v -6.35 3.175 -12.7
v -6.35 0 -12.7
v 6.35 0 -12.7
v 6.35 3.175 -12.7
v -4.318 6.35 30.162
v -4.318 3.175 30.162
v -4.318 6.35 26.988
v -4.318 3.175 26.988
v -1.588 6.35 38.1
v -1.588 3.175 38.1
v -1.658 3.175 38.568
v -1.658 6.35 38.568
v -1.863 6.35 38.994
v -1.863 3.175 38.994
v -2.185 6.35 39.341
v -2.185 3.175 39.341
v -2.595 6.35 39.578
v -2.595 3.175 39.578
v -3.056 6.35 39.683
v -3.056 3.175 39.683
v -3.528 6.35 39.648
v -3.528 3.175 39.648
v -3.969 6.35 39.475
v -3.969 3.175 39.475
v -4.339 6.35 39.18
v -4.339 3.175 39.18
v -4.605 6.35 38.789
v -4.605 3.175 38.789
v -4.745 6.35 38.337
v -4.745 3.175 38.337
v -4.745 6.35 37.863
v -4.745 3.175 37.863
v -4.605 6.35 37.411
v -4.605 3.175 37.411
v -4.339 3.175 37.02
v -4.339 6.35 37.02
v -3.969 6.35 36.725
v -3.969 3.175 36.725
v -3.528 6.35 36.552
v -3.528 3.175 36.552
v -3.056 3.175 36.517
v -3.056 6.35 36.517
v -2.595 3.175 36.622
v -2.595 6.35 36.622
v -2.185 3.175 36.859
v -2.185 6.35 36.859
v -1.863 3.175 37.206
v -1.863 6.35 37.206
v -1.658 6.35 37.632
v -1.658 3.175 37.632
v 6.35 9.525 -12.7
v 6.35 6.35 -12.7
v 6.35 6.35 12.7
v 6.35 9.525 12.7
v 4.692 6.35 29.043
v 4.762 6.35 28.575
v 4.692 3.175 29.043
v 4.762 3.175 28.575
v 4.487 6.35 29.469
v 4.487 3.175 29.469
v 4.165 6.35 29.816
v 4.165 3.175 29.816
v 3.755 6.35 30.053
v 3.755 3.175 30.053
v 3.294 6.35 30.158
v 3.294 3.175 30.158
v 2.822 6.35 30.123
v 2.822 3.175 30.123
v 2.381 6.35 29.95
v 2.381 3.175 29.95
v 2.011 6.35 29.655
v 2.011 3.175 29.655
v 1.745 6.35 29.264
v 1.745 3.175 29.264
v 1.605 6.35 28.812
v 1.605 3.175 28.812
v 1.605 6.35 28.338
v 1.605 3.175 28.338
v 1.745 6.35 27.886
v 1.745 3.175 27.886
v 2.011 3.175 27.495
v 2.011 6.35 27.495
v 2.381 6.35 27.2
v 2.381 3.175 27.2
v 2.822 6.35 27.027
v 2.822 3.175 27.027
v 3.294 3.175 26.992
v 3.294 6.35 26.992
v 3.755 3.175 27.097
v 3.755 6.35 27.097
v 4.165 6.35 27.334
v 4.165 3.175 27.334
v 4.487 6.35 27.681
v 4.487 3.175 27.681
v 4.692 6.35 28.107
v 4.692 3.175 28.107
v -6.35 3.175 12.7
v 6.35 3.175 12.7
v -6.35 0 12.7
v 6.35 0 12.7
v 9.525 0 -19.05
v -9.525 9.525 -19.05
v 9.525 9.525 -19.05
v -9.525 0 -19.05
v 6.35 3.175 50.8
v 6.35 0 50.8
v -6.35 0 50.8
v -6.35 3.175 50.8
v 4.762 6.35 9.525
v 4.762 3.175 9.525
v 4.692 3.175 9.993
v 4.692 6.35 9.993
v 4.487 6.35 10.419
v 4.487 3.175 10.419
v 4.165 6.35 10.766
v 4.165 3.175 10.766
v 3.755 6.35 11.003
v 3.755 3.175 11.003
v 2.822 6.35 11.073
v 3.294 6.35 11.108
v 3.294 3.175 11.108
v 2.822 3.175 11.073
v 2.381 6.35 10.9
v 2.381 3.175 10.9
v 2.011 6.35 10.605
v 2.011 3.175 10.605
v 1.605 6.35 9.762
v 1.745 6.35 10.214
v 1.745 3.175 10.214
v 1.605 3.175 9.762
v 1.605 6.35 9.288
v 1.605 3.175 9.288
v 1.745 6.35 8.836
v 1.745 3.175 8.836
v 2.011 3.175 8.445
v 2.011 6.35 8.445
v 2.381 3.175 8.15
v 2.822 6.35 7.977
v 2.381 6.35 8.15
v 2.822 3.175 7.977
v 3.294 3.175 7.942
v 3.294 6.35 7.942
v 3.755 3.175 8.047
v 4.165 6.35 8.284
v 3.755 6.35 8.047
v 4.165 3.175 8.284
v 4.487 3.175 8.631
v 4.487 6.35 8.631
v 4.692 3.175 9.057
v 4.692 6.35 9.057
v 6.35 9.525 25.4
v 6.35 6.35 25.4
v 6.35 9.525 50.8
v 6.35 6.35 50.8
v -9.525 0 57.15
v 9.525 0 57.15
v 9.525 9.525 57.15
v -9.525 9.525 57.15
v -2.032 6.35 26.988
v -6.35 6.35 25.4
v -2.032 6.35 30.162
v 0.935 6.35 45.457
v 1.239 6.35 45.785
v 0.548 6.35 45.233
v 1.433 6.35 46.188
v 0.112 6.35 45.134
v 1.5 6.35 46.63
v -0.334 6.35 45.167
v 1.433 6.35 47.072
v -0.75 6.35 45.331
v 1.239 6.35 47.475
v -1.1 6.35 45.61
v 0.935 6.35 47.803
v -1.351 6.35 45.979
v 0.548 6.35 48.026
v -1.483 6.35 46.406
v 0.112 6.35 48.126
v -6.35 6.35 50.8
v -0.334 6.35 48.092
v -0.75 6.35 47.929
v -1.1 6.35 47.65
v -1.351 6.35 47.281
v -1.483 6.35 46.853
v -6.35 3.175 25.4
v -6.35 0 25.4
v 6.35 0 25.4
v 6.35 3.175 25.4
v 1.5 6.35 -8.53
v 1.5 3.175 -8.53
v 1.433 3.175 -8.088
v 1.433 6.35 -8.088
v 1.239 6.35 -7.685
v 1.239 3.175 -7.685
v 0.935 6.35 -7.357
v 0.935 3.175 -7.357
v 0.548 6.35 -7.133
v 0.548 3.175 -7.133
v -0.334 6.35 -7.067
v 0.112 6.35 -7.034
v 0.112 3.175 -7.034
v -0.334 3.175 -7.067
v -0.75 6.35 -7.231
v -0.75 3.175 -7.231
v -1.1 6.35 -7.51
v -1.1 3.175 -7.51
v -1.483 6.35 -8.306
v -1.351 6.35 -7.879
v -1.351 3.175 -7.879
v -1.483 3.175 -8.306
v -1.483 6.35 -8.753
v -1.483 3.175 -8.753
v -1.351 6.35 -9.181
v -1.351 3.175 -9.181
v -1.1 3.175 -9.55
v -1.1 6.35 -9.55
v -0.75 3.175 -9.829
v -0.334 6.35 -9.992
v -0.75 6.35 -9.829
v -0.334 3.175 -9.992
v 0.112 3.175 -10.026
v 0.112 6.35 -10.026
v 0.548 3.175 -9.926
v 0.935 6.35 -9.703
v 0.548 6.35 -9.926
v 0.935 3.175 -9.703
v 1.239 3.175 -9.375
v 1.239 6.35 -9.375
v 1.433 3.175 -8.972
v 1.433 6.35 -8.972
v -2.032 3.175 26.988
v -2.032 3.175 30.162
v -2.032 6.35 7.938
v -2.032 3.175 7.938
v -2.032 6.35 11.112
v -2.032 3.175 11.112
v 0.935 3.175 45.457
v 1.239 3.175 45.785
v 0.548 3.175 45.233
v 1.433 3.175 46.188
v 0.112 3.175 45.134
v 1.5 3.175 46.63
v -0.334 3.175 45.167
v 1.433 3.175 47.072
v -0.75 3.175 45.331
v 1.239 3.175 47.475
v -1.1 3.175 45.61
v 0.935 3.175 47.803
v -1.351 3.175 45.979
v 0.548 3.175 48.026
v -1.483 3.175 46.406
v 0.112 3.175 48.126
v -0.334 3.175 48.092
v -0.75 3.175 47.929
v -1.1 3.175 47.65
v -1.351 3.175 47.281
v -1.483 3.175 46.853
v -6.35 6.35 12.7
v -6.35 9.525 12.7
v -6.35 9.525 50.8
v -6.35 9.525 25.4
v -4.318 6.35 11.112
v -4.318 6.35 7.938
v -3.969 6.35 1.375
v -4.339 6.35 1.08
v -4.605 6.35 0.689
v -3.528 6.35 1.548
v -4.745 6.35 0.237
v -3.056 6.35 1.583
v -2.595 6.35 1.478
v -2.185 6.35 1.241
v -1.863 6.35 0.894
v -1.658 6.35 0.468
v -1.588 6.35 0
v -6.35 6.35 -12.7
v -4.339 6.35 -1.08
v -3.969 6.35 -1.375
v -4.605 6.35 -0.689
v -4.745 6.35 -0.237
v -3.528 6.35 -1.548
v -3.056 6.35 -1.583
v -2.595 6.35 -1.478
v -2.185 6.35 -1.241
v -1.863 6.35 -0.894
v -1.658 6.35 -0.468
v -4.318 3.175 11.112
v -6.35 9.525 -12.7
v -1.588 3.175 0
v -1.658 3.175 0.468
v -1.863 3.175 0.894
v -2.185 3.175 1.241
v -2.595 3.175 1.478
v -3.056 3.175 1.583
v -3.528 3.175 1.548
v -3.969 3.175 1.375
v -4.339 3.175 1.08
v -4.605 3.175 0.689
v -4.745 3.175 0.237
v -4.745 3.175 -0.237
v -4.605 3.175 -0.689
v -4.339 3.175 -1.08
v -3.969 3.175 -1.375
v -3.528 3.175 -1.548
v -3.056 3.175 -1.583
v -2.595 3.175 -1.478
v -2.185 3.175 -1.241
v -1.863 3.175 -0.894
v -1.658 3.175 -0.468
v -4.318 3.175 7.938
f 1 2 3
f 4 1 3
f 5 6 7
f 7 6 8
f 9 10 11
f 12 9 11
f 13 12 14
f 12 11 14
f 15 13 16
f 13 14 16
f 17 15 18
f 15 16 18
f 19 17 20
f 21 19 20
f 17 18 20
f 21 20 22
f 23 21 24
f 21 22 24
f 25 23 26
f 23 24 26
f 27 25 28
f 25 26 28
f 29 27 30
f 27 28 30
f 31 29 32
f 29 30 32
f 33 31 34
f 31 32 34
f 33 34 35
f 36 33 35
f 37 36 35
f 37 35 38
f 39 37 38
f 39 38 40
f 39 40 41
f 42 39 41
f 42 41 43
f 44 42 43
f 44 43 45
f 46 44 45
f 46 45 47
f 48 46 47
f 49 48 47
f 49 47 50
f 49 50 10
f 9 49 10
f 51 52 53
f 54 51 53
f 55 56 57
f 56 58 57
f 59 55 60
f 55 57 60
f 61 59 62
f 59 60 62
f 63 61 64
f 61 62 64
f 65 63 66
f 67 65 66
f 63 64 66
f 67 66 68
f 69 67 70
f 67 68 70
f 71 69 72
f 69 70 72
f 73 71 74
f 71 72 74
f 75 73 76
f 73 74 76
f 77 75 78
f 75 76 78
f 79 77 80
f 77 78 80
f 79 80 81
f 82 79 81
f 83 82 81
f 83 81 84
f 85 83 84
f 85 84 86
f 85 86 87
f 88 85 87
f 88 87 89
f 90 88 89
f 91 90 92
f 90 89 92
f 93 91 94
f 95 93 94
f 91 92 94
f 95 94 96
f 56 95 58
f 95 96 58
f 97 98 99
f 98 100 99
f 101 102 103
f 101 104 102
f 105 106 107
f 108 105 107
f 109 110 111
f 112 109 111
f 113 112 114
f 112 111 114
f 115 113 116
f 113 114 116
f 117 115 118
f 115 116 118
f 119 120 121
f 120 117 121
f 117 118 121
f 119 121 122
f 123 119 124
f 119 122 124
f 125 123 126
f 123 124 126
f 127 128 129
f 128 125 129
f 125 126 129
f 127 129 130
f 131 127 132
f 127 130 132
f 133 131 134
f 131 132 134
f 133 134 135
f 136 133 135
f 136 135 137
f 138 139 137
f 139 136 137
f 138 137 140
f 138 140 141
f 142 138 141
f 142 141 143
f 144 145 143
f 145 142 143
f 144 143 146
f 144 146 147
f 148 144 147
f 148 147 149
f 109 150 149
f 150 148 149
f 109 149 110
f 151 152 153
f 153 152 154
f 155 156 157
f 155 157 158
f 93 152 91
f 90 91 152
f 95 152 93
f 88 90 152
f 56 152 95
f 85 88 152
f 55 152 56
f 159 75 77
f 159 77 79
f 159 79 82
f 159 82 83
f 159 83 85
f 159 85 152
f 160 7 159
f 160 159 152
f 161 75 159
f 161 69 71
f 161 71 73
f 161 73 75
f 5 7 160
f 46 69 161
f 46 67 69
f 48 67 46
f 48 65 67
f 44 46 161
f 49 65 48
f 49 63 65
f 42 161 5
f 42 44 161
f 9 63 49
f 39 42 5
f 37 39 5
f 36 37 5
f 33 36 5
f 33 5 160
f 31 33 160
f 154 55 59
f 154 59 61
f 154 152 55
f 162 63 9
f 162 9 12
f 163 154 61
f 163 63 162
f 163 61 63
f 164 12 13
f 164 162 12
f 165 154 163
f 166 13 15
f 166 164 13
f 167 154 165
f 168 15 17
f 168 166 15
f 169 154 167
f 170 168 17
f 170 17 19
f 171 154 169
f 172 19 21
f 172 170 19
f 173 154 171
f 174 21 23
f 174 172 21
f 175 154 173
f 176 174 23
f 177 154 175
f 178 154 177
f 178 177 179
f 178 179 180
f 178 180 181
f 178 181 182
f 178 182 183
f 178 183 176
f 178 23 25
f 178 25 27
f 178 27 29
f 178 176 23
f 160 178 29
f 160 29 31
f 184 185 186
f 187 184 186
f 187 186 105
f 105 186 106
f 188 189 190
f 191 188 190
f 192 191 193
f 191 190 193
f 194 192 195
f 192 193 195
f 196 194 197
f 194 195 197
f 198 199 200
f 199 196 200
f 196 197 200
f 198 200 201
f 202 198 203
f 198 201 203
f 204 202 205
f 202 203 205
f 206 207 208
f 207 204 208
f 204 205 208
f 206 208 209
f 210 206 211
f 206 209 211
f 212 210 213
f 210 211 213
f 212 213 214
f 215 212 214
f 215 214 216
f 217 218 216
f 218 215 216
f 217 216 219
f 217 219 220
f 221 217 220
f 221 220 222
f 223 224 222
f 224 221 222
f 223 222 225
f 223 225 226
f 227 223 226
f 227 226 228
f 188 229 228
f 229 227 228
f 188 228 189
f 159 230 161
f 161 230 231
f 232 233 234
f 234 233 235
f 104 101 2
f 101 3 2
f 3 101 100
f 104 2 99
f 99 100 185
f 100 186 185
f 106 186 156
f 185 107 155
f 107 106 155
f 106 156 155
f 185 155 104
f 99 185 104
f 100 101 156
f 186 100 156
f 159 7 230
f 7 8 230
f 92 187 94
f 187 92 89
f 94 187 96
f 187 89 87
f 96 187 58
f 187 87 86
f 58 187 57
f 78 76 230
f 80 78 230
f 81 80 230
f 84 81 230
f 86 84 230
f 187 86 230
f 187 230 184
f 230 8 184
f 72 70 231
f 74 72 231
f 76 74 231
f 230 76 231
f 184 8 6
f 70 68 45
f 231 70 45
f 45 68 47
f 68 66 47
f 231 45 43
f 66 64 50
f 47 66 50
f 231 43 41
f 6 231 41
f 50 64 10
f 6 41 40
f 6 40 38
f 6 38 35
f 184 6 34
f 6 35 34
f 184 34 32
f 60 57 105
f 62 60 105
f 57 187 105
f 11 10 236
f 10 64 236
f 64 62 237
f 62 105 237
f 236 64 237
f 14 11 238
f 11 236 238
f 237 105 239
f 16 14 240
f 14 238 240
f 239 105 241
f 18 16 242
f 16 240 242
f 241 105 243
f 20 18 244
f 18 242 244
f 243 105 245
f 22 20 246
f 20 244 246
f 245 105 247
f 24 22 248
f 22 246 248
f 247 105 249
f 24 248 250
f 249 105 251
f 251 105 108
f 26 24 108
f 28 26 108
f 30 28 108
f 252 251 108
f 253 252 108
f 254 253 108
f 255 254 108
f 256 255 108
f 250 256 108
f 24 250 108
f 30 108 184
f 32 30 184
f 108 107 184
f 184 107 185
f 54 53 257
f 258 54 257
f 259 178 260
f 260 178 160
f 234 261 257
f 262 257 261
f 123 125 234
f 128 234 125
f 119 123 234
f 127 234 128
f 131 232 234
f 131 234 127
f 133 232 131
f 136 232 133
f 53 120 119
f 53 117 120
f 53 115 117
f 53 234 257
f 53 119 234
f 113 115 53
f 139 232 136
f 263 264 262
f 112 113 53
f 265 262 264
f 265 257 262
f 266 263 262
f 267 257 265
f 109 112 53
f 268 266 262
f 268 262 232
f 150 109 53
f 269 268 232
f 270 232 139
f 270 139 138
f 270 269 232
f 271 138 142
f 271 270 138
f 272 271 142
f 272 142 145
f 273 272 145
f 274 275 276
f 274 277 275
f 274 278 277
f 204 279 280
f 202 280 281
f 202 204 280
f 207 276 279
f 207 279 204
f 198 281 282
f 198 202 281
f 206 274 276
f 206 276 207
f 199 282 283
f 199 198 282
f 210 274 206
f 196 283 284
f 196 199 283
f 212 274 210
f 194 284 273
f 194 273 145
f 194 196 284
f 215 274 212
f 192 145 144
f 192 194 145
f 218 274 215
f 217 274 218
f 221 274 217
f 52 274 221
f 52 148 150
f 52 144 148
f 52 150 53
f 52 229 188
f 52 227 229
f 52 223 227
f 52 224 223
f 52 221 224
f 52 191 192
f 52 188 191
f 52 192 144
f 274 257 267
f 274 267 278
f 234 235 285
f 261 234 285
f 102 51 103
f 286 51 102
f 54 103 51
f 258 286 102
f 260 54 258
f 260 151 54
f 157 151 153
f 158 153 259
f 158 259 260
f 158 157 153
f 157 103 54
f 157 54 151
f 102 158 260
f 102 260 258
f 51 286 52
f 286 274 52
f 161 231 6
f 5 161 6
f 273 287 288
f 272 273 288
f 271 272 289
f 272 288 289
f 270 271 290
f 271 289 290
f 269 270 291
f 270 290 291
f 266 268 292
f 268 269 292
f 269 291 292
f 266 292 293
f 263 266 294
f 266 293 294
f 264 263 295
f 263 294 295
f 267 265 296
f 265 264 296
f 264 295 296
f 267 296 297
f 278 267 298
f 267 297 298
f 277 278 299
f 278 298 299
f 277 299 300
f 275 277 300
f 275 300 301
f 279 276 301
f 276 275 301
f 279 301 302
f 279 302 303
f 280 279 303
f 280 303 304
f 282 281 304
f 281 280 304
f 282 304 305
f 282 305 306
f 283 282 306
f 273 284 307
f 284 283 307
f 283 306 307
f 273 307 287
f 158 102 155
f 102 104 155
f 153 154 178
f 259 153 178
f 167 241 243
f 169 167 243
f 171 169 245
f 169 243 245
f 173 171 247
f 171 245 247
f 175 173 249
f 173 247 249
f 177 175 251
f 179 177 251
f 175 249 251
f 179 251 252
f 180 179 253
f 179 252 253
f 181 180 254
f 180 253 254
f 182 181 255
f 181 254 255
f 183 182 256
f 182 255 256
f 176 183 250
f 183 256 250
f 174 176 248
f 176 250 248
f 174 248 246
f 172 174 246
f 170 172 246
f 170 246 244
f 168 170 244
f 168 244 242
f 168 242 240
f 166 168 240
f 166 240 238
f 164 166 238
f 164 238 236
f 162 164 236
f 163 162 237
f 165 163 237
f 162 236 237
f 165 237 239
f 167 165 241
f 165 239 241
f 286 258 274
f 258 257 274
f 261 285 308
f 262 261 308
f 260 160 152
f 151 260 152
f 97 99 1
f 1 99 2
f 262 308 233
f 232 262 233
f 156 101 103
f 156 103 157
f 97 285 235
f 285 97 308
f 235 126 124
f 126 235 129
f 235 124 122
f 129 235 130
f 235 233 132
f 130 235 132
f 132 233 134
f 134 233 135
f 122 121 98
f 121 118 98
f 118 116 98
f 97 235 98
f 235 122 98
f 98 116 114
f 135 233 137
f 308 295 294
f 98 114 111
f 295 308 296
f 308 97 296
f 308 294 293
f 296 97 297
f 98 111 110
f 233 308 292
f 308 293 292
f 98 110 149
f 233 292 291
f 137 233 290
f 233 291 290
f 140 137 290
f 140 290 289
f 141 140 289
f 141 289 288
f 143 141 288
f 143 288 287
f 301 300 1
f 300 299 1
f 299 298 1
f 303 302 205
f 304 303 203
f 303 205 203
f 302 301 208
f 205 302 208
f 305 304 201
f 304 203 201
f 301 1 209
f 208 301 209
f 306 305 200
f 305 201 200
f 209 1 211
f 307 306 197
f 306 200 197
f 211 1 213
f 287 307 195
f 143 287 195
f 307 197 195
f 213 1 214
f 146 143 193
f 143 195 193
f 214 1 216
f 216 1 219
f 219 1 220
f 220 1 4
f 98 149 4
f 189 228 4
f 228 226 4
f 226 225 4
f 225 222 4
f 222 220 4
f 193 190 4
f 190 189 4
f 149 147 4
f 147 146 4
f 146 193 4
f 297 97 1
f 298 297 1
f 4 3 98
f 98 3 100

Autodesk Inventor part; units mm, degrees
ref_plane "YZ Plane" through (0, 0, 0) normal (1, 0, 0) x (0, 1, 0)
ref_plane "XZ Plane" through (0, 0, 0) normal (0, 1, 0) x (-1, 0, 0)
ref_plane "XY Plane" through (0, 0, 0) normal (0, 0, 1) x (1, 0, 0)
sketch "Sketch1" plane through (0, 0, 0) normal (0, 1, 0) x (-1, 0, 0)
  line L0 (-6.35, 12.7) -> (6.35, 12.7)
  line L1 (6.35, 12.7) -> (6.35, -12.7)
  line L2 (6.35, -12.7) -> (-6.35, -12.7)
  line L3 (-6.35, -12.7) -> (-6.35, 12.7)
  line L4 (-6.35, 12.7) -> (6.35, -12.7) construction
  line L5 (6.35, 12.7) -> (-6.35, -12.7) construction
  line L6 (-9.525, 19.05) -> (9.525, 19.05)
  line L7 (9.525, 19.05) -> (9.525, -19.05)
  line L8 (9.525, -19.05) -> (-9.525, -19.05)
  line L9 (-9.525, -19.05) -> (-9.525, 19.05)
  line L10 (-9.525, 19.05) -> (9.525, -19.05) construction
  line L11 (9.525, 19.05) -> (-9.525, -19.05) construction
  line L12 (6.35, 15.875) -> (9.525, 15.875)
  line L13 (6.35, 15.875) -> (-9.525, 15.875)
  point P0 (0, 0)
  dimension "d0" = 12.7
  dimension "d1" = 25.4
extrude "Extrusion1" add sketch "Sketch1" along normal blind 3.175
sketch "Sketch2" plane through (0, 3.175, 0) normal (0, 1, 0) x (1, 0, 0)
  circle A0 centre (3.175, -9.525) radius 1.5875
  circle A1 centre (-3.175, 0) radius 1.5875
  circle A2 centre (0, 8.5298) radius 1.5
  line L0 (-4.318, -7.9375) -> (-2.032, -7.9375)
  line L1 (-2.032, -7.9375) -> (-2.032, -11.1125)
  line L2 (-2.032, -11.1125) -> (-4.318, -11.1125)
  line L3 (-4.318, -11.1125) -> (-4.318, -7.9375)
  line L4 (-4.318, -7.9375) -> (-2.032, -11.1125) construction
  line L5 (-2.032, -7.9375) -> (-4.318, -11.1125) construction
  line L6 (-9.525, 19.05) -> (-9.525, -19.05) projected
  line L7 (9.525, -19.05) -> (-9.525, -19.05)
  line L8 (-9.525, -19.05) -> (-9.525, 19.05)
  line L9 (-9.525, 19.05) -> (9.525, 19.05)
  line L10 (9.525, 19.05) -> (9.525, -19.05)
  line L11 (9.525, -19.05) -> (-9.525, 19.05) construction
  line L12 (-9.525, -19.05) -> (9.525, 19.05) construction
  point P0 (0, 0)
  point P1 (0, 0)
  dimension "d4" = 3.175
  dimension "d5" = 3.175
  dimension "d6" = 3
  dimension "d8" = 3.175
extrude "Extrusion2" add sketch "Sketch2" along normal blind 3.175
sketch "Sketch3" plane through (0, 6.35, 0) normal (0, 1, 0) x (1, 0, 0)
  line L0 (-9.525, 19.05) -> (-9.525, -19.05) projected
  line L1 (9.525, -19.05) -> (-9.525, -19.05)
  line L2 (-9.525, -19.05) -> (-9.525, 19.05)
  line L3 (-9.525, 19.05) -> (9.525, 19.05)
  line L4 (9.525, 19.05) -> (9.525, -19.05)
  line L5 (9.525, -19.05) -> (-9.525, 19.05) construction
  line L6 (-9.525, -19.05) -> (9.525, 19.05) construction
  line L7 (6.35, -12.7) -> (-6.35, -12.7)
  line L8 (-6.35, -12.7) -> (-6.35, 12.7)
  line L9 (-6.35, 12.7) -> (6.35, 12.7)
  line L10 (6.35, 12.7) -> (6.35, -12.7)
  line L11 (6.35, -12.7) -> (-6.35, 12.7) construction
  line L12 (-6.35, -12.7) -> (6.35, 12.7) construction
  point P0 (0, 0)
extrude "Extrusion3" add sketch "Sketch3" along normal blind 3.175
mirror "Mirror3" about plane through (-9.525, 0, 19.05) normal (0, 0, 1) of "Extrusion1", "Extrusion2", "Extrusion3"
properties part number "ExtendedSlottedCarrier"
